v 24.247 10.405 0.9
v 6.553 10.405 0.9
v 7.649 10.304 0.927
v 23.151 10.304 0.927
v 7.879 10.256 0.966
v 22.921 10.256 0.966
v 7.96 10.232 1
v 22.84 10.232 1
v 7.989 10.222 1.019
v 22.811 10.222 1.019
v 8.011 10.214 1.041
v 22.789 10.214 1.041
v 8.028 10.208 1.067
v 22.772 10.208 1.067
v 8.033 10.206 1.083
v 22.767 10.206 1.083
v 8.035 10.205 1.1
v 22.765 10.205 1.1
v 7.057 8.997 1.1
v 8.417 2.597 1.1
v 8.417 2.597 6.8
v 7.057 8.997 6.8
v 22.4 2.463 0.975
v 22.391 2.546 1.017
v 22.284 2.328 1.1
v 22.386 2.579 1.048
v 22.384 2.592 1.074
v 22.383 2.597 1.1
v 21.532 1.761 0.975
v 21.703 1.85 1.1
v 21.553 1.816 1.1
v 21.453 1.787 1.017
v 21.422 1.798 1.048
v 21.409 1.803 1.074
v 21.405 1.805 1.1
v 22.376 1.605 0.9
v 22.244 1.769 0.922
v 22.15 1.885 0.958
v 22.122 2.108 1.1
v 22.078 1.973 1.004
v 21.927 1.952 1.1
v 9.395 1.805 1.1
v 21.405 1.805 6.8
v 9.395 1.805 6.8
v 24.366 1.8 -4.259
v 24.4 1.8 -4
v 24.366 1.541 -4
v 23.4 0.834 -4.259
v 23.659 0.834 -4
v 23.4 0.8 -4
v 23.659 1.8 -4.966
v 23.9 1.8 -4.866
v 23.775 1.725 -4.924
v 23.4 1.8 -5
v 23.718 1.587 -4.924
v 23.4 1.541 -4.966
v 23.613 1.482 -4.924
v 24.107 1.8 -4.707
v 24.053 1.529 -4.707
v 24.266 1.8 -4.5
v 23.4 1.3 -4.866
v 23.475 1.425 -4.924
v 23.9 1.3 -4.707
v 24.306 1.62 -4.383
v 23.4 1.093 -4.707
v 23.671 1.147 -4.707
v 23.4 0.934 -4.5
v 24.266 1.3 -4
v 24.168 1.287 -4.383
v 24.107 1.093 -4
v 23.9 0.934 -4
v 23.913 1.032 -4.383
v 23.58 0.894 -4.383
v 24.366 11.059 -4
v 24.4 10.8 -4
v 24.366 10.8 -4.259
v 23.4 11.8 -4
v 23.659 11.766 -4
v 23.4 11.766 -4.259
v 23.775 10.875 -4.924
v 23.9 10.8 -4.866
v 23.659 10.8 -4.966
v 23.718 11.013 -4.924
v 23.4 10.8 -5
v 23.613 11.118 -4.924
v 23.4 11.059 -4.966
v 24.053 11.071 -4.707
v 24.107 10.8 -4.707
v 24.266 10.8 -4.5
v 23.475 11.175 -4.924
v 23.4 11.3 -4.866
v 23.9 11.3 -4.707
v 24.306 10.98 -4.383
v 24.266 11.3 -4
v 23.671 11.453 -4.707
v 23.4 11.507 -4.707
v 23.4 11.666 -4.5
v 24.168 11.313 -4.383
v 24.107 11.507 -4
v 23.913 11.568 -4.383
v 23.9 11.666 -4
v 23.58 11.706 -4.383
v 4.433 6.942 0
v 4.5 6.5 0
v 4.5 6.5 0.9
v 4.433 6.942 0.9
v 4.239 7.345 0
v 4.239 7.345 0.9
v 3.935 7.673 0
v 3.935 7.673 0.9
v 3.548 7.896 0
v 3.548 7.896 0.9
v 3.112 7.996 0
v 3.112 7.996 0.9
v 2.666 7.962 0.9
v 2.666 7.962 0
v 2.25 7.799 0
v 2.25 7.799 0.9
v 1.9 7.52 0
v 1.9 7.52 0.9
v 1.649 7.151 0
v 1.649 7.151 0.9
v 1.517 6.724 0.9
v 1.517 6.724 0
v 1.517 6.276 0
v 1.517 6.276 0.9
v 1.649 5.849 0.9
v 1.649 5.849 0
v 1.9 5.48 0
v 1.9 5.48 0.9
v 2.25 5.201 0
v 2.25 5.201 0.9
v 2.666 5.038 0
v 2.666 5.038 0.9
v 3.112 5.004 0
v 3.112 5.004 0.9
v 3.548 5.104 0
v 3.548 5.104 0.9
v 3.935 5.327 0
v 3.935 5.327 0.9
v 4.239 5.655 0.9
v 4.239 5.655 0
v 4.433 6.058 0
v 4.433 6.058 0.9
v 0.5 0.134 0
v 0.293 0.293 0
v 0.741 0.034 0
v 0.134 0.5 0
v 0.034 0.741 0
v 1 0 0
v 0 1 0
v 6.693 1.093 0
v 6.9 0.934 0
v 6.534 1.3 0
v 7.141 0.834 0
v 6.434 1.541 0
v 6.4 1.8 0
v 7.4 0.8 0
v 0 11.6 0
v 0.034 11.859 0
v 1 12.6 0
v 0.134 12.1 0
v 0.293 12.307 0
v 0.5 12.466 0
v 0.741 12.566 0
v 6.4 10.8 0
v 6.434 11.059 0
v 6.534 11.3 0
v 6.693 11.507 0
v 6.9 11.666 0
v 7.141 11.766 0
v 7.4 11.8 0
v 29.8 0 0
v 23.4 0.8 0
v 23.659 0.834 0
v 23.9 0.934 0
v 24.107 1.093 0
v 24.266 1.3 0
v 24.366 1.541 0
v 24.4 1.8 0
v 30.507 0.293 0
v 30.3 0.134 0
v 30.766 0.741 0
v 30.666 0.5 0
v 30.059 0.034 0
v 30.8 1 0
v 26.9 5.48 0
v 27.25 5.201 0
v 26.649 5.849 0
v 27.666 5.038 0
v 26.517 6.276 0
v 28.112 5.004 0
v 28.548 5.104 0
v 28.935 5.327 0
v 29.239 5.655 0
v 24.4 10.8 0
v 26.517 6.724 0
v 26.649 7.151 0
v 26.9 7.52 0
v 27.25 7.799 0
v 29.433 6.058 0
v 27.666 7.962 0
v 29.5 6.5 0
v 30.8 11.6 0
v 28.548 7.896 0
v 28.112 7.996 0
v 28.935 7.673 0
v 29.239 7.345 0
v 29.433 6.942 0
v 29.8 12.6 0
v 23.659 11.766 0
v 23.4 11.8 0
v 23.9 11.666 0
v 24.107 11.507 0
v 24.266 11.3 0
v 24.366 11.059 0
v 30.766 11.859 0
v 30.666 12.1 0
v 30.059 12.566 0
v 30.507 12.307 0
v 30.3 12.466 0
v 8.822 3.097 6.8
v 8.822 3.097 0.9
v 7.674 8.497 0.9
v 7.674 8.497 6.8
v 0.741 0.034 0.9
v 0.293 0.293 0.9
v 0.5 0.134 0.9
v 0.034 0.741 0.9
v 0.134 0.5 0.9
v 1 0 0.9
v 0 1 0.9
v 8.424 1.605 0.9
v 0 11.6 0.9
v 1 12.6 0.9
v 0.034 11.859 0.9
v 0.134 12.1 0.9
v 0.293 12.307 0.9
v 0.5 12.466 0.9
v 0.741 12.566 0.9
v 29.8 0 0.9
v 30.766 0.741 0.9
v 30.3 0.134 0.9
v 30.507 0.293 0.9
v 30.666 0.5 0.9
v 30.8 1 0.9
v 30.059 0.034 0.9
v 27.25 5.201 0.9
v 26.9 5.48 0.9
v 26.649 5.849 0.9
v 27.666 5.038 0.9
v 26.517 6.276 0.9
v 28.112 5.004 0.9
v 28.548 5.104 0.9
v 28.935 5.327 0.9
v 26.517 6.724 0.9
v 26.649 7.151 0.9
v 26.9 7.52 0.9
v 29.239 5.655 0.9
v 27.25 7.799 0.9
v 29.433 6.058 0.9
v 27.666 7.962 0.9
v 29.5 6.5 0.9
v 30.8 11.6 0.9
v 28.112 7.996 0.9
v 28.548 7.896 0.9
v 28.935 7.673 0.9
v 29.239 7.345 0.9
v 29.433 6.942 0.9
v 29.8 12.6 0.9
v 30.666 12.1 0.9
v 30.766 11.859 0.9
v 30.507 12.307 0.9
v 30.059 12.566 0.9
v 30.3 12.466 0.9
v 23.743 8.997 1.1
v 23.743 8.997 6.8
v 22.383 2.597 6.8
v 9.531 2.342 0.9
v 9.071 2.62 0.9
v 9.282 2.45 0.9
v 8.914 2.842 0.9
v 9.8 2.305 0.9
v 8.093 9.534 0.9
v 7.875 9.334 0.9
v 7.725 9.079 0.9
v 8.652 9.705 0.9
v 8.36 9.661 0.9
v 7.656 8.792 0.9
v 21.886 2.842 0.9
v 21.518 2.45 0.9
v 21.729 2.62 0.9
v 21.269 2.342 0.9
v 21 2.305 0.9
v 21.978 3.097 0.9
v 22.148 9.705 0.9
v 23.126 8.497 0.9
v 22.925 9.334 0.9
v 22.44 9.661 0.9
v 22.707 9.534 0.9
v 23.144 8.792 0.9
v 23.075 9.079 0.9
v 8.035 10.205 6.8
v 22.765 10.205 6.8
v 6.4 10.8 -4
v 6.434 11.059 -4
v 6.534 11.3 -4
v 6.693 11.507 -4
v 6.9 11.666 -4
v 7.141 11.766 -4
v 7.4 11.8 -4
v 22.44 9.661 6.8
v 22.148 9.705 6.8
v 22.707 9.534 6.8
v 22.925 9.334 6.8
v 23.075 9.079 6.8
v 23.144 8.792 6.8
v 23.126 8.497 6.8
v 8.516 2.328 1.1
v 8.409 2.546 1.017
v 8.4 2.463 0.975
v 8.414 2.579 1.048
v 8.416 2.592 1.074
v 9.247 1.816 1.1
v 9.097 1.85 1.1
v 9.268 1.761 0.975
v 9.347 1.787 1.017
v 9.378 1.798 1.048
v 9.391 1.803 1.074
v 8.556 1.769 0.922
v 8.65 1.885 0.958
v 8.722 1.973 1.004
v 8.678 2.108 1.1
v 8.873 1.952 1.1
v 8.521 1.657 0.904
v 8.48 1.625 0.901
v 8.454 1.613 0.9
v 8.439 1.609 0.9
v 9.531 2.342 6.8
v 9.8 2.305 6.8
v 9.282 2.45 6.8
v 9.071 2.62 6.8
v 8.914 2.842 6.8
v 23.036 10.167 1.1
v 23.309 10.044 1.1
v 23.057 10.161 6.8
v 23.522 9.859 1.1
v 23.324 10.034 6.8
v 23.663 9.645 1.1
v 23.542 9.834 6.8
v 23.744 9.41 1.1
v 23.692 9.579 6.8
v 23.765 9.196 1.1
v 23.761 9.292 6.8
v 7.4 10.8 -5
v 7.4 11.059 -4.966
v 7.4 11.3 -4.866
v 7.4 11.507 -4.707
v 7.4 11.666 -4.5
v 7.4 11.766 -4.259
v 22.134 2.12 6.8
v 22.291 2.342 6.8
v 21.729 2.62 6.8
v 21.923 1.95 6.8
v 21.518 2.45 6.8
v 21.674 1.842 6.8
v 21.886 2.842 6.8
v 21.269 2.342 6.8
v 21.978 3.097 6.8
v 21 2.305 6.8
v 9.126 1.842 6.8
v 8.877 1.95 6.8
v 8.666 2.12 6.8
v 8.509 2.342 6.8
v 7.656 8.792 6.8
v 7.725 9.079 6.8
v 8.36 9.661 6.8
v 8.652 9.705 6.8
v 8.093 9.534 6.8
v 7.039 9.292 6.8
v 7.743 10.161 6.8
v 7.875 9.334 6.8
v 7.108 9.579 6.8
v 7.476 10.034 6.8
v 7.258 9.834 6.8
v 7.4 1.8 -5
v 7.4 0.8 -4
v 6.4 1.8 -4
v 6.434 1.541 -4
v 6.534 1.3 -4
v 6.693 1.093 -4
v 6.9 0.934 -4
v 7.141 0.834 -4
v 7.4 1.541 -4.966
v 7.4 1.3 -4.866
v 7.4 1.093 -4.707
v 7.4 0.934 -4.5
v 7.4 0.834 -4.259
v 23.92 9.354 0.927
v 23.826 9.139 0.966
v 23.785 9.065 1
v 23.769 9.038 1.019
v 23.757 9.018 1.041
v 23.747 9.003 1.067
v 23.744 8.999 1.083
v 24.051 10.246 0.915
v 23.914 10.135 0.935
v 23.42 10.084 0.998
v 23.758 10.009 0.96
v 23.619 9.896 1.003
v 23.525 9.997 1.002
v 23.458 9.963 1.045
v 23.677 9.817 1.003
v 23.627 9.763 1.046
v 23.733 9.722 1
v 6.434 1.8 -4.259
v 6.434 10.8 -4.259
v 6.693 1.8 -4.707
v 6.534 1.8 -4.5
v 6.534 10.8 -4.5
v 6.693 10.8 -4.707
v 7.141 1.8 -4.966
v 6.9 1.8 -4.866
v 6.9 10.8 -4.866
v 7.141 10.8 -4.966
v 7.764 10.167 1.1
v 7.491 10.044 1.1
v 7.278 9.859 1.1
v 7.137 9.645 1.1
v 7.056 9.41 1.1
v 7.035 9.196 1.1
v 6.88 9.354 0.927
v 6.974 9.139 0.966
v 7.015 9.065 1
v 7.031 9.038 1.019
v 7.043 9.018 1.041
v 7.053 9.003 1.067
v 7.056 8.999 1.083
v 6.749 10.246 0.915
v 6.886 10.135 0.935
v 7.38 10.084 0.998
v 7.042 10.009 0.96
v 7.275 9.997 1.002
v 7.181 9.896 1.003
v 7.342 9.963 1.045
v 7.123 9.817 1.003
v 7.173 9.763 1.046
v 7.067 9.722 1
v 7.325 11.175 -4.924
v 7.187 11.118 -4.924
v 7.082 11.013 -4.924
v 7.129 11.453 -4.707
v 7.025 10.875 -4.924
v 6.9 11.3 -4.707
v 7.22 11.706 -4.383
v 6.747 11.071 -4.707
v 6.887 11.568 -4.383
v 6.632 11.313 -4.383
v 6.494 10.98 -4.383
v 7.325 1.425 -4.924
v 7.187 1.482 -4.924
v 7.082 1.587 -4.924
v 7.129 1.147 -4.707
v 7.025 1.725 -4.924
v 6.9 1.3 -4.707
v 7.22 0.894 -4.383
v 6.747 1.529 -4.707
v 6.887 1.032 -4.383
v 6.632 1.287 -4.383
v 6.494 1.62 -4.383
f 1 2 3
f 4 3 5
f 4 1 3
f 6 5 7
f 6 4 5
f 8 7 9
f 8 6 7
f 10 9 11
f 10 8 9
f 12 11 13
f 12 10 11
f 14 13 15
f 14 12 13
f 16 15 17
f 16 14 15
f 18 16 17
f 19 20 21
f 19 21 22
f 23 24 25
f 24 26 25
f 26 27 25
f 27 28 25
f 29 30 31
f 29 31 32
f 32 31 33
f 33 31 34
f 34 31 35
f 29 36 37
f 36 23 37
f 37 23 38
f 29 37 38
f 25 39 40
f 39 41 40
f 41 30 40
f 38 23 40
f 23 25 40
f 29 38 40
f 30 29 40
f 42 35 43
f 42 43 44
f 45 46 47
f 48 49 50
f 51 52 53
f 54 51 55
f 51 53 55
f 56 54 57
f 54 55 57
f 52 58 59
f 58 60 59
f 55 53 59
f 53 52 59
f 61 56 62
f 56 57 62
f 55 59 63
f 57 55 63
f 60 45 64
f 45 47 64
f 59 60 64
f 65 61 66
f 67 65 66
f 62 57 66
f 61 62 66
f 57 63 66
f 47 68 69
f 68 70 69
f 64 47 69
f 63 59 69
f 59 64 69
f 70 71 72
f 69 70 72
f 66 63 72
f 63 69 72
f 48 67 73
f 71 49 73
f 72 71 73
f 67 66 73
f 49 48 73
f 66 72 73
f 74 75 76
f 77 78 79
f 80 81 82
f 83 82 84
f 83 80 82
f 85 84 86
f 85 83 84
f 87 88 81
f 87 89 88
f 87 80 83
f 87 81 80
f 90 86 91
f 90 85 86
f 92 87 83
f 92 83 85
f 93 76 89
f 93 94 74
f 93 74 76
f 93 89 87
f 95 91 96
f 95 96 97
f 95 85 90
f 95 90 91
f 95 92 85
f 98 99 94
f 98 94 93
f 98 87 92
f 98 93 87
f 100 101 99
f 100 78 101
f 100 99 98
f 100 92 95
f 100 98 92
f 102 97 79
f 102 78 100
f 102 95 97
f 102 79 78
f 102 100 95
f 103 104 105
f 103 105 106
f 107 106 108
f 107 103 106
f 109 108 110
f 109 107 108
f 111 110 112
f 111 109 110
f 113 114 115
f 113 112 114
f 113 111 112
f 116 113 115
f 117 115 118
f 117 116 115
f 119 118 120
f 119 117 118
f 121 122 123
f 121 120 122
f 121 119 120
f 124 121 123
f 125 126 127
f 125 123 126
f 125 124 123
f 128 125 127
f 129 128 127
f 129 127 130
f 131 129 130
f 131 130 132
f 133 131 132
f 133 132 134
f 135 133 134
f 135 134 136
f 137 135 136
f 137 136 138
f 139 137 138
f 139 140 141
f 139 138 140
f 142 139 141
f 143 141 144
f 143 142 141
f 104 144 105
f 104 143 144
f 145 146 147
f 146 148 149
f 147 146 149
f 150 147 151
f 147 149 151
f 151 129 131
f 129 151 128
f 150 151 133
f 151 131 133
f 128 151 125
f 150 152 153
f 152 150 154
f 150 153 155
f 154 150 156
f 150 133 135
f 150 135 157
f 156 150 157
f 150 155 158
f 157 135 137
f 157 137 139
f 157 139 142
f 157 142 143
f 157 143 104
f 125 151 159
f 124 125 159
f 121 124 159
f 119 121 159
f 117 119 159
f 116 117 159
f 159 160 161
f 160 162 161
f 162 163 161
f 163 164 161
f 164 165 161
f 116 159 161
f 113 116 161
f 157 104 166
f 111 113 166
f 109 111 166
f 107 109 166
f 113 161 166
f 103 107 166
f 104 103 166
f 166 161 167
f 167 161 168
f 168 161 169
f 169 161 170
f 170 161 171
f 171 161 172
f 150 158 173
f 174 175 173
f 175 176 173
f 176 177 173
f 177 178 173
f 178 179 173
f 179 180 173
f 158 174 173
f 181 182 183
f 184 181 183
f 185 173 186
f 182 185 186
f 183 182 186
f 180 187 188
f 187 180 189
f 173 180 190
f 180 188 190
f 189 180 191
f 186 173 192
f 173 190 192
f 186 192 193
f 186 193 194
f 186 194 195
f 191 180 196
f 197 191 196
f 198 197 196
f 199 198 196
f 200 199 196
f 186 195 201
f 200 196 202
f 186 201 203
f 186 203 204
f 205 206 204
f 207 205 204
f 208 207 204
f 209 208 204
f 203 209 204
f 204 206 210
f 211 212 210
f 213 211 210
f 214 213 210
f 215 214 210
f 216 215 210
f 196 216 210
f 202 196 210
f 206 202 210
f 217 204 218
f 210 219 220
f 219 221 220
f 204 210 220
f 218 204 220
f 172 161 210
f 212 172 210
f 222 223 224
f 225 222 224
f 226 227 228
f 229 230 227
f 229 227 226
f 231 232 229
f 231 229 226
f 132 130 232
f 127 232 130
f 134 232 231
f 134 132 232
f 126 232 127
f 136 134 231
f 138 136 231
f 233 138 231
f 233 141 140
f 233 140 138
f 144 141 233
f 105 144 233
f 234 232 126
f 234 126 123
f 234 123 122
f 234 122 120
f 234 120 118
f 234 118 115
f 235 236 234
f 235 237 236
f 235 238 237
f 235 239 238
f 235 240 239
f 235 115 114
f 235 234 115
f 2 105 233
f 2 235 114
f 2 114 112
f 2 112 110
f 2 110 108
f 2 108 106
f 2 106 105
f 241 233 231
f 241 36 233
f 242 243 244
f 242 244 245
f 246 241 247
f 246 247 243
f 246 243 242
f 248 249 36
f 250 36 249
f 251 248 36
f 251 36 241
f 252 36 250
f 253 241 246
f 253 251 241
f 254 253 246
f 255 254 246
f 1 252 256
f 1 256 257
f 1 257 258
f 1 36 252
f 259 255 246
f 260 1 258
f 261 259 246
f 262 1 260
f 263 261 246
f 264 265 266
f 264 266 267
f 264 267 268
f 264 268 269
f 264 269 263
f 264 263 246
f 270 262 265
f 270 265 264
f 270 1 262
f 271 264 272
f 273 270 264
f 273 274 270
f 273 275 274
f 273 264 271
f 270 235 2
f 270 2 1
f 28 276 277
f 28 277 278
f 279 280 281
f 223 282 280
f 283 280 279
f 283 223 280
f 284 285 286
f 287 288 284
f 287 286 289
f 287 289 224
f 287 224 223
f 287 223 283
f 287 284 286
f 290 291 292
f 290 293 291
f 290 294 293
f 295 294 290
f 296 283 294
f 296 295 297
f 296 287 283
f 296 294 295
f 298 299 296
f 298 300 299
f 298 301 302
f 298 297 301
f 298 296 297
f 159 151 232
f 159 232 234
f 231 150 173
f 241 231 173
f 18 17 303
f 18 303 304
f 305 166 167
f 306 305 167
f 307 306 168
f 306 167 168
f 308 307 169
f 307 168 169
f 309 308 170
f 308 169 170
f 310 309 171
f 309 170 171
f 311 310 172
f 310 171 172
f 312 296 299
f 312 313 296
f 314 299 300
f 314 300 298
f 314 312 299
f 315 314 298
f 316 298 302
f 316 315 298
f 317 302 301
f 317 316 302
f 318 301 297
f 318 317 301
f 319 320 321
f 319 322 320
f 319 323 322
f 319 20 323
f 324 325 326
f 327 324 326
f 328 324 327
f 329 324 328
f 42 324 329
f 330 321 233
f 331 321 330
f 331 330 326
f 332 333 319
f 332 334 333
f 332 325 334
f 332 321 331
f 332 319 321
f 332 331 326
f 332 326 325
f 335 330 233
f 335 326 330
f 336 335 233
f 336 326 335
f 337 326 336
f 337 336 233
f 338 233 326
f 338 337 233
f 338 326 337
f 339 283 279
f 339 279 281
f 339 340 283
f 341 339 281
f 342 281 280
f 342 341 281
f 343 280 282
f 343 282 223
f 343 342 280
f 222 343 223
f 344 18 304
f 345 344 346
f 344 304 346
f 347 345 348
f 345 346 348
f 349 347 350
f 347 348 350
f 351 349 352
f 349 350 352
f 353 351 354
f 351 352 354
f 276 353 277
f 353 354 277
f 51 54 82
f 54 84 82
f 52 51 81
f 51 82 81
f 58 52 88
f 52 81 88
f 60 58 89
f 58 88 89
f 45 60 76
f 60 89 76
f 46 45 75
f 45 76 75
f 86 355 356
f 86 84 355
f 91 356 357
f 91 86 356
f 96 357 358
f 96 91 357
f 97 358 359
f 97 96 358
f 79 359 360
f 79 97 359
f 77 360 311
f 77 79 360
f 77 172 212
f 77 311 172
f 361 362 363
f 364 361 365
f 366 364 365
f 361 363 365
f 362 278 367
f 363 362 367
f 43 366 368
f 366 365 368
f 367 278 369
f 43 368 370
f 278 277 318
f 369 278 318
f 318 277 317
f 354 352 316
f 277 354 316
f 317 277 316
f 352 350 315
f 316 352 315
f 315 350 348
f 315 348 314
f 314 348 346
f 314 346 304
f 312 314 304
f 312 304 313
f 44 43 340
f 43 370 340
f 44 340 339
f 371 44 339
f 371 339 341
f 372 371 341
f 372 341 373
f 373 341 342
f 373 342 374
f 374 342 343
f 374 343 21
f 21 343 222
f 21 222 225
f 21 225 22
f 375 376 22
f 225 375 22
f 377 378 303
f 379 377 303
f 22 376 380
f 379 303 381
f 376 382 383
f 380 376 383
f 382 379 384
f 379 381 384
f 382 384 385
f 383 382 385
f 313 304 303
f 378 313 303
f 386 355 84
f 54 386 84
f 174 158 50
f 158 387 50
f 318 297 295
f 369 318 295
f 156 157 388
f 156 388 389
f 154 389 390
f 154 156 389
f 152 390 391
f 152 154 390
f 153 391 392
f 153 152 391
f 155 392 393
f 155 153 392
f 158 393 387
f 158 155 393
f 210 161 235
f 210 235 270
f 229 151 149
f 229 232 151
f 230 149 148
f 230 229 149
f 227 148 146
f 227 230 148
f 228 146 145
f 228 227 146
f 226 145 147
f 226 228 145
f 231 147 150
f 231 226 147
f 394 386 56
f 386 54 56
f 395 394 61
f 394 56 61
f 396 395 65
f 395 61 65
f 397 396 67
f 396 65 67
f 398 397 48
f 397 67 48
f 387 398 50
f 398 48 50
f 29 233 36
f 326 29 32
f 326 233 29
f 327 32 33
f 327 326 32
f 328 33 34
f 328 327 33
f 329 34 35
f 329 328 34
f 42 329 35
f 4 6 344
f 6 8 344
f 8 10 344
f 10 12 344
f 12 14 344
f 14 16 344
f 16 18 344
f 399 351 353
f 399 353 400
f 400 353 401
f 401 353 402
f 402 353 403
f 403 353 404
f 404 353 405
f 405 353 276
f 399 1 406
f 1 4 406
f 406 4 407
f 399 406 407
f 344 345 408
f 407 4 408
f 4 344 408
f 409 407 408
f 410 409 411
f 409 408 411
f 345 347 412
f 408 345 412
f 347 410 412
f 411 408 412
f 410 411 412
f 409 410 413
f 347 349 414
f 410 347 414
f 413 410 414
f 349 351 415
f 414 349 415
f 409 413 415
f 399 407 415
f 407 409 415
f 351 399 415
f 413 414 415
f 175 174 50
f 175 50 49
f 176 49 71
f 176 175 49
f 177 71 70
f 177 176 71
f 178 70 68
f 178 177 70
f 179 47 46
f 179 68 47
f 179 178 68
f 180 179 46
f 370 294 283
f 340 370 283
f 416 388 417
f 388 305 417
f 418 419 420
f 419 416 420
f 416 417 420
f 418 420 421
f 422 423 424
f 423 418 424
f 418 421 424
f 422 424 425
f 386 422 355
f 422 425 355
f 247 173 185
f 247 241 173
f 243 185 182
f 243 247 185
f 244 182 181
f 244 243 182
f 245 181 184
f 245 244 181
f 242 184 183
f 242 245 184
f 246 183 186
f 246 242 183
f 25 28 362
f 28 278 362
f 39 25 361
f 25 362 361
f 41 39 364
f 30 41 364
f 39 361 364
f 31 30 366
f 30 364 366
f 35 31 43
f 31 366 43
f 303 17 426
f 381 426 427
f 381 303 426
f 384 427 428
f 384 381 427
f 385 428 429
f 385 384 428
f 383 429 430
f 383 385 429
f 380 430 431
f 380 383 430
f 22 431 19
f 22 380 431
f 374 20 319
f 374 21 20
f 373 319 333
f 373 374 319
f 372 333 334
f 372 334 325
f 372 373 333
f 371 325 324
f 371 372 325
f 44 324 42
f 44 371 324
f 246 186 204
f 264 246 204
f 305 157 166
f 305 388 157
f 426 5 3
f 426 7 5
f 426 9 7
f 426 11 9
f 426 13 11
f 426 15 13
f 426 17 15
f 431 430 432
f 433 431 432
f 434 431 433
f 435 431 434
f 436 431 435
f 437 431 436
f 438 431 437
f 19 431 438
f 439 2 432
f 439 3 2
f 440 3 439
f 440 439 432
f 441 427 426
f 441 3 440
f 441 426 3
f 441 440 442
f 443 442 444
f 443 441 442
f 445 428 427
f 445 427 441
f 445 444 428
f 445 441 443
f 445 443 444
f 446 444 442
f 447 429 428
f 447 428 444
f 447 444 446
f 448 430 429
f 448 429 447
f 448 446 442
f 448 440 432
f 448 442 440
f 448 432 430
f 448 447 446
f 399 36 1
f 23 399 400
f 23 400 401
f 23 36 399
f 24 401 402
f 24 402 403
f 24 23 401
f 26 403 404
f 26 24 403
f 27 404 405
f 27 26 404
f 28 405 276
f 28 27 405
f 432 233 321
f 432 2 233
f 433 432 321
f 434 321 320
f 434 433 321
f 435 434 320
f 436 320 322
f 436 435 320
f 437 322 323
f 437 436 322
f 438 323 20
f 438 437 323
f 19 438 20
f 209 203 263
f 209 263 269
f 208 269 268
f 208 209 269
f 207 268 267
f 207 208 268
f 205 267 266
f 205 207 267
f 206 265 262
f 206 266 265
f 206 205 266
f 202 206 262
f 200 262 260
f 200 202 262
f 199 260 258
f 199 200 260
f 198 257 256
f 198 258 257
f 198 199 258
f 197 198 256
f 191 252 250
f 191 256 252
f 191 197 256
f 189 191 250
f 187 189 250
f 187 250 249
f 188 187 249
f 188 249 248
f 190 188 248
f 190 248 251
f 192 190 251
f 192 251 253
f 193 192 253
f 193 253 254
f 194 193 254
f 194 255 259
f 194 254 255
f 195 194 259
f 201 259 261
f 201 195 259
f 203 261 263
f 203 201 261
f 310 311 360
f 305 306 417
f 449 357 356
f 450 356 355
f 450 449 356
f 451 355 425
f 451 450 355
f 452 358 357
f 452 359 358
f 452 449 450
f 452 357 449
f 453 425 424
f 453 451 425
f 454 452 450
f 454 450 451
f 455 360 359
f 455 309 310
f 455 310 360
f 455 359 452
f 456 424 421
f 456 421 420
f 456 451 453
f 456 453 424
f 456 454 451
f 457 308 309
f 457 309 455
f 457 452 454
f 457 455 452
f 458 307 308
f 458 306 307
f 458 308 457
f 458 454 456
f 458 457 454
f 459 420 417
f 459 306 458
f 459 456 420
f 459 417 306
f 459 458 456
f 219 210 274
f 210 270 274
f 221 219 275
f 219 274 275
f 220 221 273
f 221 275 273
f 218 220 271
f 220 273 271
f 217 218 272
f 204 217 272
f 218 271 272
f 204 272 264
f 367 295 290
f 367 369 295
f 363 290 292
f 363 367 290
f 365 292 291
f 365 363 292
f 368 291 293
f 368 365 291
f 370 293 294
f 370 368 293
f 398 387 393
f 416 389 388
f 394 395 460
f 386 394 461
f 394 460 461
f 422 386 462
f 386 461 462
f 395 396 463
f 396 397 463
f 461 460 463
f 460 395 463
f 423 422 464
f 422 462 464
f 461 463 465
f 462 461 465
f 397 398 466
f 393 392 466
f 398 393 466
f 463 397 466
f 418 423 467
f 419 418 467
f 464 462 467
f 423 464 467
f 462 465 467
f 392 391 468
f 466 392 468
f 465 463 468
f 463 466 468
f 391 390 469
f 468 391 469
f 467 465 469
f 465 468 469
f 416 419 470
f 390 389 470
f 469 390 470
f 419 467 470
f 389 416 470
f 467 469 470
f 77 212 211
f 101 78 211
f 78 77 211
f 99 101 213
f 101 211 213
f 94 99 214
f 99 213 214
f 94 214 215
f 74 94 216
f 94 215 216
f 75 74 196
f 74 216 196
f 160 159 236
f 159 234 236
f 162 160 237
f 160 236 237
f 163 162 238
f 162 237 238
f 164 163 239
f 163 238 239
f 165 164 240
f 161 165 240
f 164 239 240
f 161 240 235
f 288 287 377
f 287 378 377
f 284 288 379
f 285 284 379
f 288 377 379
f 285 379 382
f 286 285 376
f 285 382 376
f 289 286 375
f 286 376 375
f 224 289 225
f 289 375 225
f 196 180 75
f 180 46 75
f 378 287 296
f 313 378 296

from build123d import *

# Parameters (mm, degrees)
CYLINDER_R        = 1.5
CYLINDER_DEPTH    = 10
CYLINDER001_R     = 1.5
CYLINDER001_DEPTH = 10
BOX001_W          = 18
BOX001_H          = 11
BOX001_DEPTH      = 5.2
BOX_W             = 30.8
BOX_H             = 12.6
BOX_DEPTH         = 0.9
FILLET_R          = 1
FILLET001_R       = 1
PAD_DEPTH         = 5.9
FILLET002_R       = 0.2
FILLET003_R       = 1


with BuildPart() as cylinder:
    # Cylinder → Cylinder (new body)
    with BuildSketch(Plane.XY.offset(-2)):
        Circle(CYLINDER_R)
    extrude(amount=CYLINDER_DEPTH)


with BuildPart() as fusion:
    # Cylinder001 → Cylinder001 (new body)
    with BuildSketch(Plane(origin=(25, 0, -2), x_dir=(1, 0, 0), z_dir=(0, 0, 1))):
        Circle(CYLINDER001_R)
    extrude(amount=CYLINDER001_DEPTH)

    # Fusion: union Cylinder
    add(cylinder.part)


with BuildPart() as fusion_1:
    # Fusion placement: moved
    add(fusion.part.moved(Location((3, 6.5, 0))))


with BuildPart() as cube001:
    # Box001 → Box001 (new body)
    with BuildSketch(Plane(origin=(6.4, 0.8, -5), x_dir=(1, 0, 0), z_dir=(0, 0, 1))):
        with Locations((9, 5.5)):
            Rectangle(BOX001_W, BOX001_H)
    extrude(amount=BOX001_DEPTH)


with BuildPart() as fillet003:
    # Box → Box (new body)
    with BuildSketch(Plane.XY):
        with Locations((15.4, 6.3)):
            Rectangle(BOX_W, BOX_H)
    extrude(amount=BOX_DEPTH)

    # Fusion001: union Cube001
    add(cube001.part)

    # Cut: cut Fusion
    add(fusion_1.part, mode=Mode.SUBTRACT)

    # Fillet
    fillet_edges = [fillet003.edges().sort_by_distance(p)[0] for p in [
        (24.4, 0.8, -2.5),
        (24.4, 11.8, -2.5),
        (24.4, 6.3, -5),
        (6.4, 0.8, -2.5),
        (15.4, 0.8, -5),
        (6.4, 11.8, -2.5),
        (15.4, 11.8, -5),
        (6.4, 6.3, -5),
    ]]
    fillet(fillet_edges, radius=FILLET_R)

    # Fillet001
    fillet001_edges = [fillet003.edges().sort_by_distance(p)[0] for p in [
        (0, 0, 0.45),
        (0, 12.6, 0.45),
        (30.8, 12.6, 0.45),
        (30.8, 0, 0.45),
    ]]
    fillet(fillet001_edges, radius=FILLET001_R)

    # Sketch → Pad (new body)
    with BuildSketch(Plane.XY.offset(0.9)):
        Polygon((6.8, 10.204892), (24, 10.204892), (22.214525, 1.804892), (8.585475, 1.804892), align=None)
        Polygon((7.417449, 9.704892), (23.382551, 9.704892), (21.809633, 2.304892), (8.990367, 2.304892), align=None, mode=Mode.SUBTRACT)
    extrude(amount=PAD_DEPTH)

    # Fillet002
    fillet002_edges = [fillet003.edges().sort_by_distance(p)[0] for p in [
        (15.4, 10.204892, 0.9),
        (23.107262, 6.004892, 0.9),
        (15.4, 1.804892, 0.9),
        (7.692738, 6.004892, 0.9),
    ]]
    fillet(fillet002_edges, radius=FILLET002_R)

    # Fillet003
    fillet003_edges = [fillet003.edges().sort_by_distance(p)[0] for p in [
        (6.8, 10.204892, 3.95),
        (24, 10.204892, 3.95),
        (8.585475, 1.804892, 3.95),
        (22.214525, 1.804892, 3.95),
        (7.417449, 9.704892, 3.85),
        (23.382551, 9.704892, 3.85),
        (21.809633, 2.304892, 3.85),
        (8.990367, 2.304892, 3.85),
    ]]
    fillet(fillet003_edges, radius=FILLET003_R)


solid = fillet003.part
